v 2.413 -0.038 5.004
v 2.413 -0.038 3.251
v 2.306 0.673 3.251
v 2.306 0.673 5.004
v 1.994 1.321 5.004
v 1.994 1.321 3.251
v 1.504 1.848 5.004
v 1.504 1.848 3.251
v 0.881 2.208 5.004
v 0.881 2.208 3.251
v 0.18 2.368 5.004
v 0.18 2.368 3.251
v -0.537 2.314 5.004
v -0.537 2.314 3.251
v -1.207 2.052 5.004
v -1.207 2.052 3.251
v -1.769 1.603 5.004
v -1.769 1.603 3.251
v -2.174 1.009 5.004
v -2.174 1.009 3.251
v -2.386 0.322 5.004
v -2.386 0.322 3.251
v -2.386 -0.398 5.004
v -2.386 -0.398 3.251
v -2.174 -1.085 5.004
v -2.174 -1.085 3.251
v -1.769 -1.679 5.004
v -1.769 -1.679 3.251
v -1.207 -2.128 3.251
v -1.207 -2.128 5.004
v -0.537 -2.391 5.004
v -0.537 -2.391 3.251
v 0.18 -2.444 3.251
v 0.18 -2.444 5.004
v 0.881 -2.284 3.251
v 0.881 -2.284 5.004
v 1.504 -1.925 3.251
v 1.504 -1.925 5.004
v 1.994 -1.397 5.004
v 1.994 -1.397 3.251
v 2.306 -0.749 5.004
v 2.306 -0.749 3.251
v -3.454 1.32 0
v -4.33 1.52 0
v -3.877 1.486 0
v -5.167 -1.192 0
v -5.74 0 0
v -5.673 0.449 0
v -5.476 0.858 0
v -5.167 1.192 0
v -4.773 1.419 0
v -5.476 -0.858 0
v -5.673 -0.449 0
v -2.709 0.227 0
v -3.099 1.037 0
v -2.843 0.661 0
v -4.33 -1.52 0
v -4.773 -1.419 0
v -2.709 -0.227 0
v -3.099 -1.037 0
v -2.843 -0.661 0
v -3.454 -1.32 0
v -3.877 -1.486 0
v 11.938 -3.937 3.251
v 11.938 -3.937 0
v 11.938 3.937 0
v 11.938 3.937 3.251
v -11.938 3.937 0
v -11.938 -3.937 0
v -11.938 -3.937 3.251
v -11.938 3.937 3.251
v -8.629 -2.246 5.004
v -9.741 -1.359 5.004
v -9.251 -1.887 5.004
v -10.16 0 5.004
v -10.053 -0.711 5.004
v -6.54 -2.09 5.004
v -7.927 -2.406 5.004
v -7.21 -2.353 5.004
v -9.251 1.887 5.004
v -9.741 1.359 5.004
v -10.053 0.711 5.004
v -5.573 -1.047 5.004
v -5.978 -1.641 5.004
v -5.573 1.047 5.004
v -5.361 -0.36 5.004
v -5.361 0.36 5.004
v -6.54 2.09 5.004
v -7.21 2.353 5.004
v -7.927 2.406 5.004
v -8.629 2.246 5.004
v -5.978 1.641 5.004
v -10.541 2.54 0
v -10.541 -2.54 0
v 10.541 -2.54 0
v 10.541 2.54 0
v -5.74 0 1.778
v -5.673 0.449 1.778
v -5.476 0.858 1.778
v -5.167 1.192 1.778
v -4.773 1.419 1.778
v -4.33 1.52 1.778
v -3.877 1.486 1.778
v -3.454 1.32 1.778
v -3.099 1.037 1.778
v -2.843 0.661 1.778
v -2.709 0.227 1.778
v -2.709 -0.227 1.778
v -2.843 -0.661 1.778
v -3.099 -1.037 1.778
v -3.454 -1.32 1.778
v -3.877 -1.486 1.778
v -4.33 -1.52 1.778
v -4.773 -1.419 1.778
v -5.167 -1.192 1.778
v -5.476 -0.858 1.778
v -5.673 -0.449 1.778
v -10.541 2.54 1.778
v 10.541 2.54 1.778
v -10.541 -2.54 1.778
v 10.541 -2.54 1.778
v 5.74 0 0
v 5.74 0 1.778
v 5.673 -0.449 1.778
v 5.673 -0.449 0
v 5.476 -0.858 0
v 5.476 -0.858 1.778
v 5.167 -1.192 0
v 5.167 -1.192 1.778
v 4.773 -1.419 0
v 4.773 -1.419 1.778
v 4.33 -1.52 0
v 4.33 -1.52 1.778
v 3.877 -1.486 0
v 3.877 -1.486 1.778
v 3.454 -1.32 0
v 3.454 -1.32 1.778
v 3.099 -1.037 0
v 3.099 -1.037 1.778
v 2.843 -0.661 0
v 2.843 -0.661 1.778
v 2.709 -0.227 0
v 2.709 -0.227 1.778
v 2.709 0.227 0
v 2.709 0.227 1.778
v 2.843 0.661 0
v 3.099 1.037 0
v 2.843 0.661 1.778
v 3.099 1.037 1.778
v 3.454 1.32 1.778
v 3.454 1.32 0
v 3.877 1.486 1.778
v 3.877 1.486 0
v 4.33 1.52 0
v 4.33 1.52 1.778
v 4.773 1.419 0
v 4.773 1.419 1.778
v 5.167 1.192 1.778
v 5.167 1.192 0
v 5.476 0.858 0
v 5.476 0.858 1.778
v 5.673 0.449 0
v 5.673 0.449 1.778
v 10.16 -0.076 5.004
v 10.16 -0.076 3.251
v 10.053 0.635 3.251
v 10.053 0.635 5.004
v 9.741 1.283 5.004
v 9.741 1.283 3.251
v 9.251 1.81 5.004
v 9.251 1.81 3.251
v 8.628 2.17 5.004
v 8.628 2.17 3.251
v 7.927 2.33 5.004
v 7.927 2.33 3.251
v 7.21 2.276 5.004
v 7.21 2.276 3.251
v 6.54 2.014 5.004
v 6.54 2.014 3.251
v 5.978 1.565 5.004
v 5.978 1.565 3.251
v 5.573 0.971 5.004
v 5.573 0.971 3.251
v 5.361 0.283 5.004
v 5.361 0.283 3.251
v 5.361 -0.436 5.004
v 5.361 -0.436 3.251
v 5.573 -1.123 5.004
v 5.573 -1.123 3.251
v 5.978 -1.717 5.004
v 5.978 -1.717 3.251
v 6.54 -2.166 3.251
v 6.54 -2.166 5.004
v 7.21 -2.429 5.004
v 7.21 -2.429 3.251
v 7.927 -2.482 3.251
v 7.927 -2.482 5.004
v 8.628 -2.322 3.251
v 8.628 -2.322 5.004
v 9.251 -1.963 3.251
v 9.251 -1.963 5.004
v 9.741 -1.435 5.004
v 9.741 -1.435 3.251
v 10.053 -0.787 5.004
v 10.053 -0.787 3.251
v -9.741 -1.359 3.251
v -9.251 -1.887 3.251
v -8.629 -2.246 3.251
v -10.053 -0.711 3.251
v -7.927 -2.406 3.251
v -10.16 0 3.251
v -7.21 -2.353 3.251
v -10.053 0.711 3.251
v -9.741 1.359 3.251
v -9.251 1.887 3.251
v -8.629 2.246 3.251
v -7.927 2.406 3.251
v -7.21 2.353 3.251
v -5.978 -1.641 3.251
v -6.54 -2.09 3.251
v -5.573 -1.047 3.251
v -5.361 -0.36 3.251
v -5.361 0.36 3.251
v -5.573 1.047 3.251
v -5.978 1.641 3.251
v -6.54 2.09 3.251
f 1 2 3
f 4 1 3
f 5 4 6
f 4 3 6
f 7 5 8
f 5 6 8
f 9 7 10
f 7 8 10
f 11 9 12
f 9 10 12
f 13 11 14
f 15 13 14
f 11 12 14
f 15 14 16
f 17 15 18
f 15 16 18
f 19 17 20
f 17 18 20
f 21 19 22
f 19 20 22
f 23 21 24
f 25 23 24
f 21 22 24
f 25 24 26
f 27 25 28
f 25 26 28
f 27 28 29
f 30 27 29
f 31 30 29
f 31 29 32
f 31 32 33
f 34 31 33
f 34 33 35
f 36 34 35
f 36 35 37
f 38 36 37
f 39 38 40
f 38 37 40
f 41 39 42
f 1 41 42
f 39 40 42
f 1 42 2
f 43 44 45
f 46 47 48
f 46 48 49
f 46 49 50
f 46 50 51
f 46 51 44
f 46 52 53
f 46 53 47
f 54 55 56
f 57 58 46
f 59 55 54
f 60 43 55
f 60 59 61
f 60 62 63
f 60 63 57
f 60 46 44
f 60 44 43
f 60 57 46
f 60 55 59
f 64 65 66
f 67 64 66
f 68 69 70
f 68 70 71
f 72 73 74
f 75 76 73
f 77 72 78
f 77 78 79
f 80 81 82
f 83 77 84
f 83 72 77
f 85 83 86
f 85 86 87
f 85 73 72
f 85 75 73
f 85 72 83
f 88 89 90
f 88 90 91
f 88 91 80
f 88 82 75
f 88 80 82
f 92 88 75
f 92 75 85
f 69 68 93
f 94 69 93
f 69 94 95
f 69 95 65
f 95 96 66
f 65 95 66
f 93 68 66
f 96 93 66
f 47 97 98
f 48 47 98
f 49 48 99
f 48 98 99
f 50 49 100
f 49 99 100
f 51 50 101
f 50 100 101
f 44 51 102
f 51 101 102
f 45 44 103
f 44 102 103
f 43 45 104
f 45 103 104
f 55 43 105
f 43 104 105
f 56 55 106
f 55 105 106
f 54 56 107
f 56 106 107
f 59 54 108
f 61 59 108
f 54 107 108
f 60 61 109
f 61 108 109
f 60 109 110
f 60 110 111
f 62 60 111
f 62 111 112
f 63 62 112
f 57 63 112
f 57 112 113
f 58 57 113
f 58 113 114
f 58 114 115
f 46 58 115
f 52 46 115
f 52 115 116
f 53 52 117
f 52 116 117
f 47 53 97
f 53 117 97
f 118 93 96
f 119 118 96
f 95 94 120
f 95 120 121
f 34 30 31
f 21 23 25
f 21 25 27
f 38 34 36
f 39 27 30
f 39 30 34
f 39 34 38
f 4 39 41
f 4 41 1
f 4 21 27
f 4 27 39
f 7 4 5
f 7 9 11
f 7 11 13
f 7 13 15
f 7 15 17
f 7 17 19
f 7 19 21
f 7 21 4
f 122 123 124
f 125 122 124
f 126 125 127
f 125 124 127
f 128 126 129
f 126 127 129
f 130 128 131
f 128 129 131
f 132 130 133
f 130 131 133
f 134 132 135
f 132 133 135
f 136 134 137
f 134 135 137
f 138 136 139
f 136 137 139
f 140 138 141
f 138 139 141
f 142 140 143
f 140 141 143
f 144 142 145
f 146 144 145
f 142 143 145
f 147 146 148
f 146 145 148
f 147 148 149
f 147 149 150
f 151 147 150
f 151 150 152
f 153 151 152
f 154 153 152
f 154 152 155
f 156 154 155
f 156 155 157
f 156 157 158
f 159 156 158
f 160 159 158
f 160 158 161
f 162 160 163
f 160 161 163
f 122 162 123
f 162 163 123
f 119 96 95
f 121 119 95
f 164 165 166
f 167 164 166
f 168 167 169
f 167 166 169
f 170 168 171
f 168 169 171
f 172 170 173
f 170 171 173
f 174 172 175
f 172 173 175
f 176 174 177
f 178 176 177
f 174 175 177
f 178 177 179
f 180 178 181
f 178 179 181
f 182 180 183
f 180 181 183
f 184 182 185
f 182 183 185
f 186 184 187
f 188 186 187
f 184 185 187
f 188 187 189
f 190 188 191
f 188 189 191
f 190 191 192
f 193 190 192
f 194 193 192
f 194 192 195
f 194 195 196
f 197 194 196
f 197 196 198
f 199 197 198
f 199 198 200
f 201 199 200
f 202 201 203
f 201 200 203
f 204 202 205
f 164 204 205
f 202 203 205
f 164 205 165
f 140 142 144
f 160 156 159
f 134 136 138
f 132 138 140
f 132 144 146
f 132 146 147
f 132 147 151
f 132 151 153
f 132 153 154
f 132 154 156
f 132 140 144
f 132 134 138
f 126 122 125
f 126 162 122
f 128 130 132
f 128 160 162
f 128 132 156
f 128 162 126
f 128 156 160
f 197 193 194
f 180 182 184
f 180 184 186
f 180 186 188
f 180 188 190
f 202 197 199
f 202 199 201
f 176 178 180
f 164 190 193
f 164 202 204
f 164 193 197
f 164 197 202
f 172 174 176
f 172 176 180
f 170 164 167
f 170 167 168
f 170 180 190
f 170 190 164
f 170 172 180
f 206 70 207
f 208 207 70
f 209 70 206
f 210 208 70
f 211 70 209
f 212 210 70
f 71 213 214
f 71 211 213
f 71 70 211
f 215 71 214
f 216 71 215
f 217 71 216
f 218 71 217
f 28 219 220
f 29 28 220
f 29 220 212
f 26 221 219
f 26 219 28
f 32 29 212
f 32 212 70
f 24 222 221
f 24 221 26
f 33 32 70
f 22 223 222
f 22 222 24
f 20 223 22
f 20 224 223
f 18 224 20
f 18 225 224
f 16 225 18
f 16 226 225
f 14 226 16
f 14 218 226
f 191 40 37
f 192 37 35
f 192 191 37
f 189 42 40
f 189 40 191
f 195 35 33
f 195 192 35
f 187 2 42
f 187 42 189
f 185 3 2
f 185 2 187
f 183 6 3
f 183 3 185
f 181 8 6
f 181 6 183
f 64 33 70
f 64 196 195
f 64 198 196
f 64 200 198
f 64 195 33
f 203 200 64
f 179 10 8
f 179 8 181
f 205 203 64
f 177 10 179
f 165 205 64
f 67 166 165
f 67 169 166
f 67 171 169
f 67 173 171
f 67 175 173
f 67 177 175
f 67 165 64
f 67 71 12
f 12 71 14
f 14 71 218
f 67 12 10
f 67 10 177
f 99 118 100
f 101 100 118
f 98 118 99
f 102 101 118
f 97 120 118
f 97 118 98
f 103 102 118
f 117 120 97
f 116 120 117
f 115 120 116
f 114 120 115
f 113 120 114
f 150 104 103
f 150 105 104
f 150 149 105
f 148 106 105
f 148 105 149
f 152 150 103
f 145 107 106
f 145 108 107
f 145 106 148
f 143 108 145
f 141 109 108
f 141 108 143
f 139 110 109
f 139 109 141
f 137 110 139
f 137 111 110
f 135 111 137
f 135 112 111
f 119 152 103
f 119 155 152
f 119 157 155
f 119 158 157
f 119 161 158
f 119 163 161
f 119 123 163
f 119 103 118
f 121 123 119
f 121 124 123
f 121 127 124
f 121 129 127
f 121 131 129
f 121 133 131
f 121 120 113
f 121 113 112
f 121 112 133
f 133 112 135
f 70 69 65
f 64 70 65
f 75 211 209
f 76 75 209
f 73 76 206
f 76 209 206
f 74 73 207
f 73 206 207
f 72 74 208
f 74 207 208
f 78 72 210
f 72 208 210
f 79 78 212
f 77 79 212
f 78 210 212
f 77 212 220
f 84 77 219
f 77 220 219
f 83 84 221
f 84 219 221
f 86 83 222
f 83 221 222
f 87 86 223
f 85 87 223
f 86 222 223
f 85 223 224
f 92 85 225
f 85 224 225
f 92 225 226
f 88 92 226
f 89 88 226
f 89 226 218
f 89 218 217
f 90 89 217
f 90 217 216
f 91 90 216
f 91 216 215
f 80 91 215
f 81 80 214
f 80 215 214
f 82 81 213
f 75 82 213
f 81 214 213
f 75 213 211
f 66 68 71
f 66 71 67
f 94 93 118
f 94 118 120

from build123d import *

# Parameters (mm, degrees)
F0_W     = 23.876
F0_H     = 7.874
F1_DEPTH = 3.2512
F2_W     = 21.082
F2_H     = 5.08
F3_DEPTH = 1.778
F4_R     = 2.413
F5_DEPTH = 1.7526
F6_R     = 1.524
F7_DEPTH = 1.778


with BuildPart() as f1:
    # F0 (on Top) → F1 (new body)
    with BuildSketch(Plane.XY):
        Rectangle(F0_W, F0_H)
    extrude(amount=F1_DEPTH)

    # F2 (on face) → F3 (cut)
    with BuildSketch(Plane(origin=(0, 0, 0), x_dir=(1, 0, 0), z_dir=(0, 0, -1))):
        Rectangle(F2_W, F2_H)
    extrude(amount=-F3_DEPTH, mode=Mode.SUBTRACT)

    # F4 (on face) → F5 (join)
    with BuildSketch(Plane.XY.offset(3.2512)):
        with BuildLine():
            ThreePointArc((-5.334, 0), (-7.747, 2.413), (-10.16, 0))
            ThreePointArc((-10.16, 0), (-7.747, -2.413), (-5.334, 0))
        make_face()
        with Locations((-9.4e-05, -0.038094)):
            Circle(F4_R)
        with Locations((7.746813, -0.076188)):
            Circle(F4_R)
    extrude(amount=F5_DEPTH)

    # F6 (on face) → F7 (join)
    with BuildSketch(Plane(origin=(0, 0, 1.778), x_dir=(1, 0, 0), z_dir=(0, 0, -1))):
        with BuildLine():
            ThreePointArc((-2.6924, 0), (-4.2164, 1.524), (-5.7404, 0))
            ThreePointArc((-5.7404, 0), (-4.2164, -1.524), (-2.6924, 0))
        make_face()
        with Locations((4.2164, 0)):
            Circle(F6_R)
    extrude(amount=F7_DEPTH)


solid = f1.part
